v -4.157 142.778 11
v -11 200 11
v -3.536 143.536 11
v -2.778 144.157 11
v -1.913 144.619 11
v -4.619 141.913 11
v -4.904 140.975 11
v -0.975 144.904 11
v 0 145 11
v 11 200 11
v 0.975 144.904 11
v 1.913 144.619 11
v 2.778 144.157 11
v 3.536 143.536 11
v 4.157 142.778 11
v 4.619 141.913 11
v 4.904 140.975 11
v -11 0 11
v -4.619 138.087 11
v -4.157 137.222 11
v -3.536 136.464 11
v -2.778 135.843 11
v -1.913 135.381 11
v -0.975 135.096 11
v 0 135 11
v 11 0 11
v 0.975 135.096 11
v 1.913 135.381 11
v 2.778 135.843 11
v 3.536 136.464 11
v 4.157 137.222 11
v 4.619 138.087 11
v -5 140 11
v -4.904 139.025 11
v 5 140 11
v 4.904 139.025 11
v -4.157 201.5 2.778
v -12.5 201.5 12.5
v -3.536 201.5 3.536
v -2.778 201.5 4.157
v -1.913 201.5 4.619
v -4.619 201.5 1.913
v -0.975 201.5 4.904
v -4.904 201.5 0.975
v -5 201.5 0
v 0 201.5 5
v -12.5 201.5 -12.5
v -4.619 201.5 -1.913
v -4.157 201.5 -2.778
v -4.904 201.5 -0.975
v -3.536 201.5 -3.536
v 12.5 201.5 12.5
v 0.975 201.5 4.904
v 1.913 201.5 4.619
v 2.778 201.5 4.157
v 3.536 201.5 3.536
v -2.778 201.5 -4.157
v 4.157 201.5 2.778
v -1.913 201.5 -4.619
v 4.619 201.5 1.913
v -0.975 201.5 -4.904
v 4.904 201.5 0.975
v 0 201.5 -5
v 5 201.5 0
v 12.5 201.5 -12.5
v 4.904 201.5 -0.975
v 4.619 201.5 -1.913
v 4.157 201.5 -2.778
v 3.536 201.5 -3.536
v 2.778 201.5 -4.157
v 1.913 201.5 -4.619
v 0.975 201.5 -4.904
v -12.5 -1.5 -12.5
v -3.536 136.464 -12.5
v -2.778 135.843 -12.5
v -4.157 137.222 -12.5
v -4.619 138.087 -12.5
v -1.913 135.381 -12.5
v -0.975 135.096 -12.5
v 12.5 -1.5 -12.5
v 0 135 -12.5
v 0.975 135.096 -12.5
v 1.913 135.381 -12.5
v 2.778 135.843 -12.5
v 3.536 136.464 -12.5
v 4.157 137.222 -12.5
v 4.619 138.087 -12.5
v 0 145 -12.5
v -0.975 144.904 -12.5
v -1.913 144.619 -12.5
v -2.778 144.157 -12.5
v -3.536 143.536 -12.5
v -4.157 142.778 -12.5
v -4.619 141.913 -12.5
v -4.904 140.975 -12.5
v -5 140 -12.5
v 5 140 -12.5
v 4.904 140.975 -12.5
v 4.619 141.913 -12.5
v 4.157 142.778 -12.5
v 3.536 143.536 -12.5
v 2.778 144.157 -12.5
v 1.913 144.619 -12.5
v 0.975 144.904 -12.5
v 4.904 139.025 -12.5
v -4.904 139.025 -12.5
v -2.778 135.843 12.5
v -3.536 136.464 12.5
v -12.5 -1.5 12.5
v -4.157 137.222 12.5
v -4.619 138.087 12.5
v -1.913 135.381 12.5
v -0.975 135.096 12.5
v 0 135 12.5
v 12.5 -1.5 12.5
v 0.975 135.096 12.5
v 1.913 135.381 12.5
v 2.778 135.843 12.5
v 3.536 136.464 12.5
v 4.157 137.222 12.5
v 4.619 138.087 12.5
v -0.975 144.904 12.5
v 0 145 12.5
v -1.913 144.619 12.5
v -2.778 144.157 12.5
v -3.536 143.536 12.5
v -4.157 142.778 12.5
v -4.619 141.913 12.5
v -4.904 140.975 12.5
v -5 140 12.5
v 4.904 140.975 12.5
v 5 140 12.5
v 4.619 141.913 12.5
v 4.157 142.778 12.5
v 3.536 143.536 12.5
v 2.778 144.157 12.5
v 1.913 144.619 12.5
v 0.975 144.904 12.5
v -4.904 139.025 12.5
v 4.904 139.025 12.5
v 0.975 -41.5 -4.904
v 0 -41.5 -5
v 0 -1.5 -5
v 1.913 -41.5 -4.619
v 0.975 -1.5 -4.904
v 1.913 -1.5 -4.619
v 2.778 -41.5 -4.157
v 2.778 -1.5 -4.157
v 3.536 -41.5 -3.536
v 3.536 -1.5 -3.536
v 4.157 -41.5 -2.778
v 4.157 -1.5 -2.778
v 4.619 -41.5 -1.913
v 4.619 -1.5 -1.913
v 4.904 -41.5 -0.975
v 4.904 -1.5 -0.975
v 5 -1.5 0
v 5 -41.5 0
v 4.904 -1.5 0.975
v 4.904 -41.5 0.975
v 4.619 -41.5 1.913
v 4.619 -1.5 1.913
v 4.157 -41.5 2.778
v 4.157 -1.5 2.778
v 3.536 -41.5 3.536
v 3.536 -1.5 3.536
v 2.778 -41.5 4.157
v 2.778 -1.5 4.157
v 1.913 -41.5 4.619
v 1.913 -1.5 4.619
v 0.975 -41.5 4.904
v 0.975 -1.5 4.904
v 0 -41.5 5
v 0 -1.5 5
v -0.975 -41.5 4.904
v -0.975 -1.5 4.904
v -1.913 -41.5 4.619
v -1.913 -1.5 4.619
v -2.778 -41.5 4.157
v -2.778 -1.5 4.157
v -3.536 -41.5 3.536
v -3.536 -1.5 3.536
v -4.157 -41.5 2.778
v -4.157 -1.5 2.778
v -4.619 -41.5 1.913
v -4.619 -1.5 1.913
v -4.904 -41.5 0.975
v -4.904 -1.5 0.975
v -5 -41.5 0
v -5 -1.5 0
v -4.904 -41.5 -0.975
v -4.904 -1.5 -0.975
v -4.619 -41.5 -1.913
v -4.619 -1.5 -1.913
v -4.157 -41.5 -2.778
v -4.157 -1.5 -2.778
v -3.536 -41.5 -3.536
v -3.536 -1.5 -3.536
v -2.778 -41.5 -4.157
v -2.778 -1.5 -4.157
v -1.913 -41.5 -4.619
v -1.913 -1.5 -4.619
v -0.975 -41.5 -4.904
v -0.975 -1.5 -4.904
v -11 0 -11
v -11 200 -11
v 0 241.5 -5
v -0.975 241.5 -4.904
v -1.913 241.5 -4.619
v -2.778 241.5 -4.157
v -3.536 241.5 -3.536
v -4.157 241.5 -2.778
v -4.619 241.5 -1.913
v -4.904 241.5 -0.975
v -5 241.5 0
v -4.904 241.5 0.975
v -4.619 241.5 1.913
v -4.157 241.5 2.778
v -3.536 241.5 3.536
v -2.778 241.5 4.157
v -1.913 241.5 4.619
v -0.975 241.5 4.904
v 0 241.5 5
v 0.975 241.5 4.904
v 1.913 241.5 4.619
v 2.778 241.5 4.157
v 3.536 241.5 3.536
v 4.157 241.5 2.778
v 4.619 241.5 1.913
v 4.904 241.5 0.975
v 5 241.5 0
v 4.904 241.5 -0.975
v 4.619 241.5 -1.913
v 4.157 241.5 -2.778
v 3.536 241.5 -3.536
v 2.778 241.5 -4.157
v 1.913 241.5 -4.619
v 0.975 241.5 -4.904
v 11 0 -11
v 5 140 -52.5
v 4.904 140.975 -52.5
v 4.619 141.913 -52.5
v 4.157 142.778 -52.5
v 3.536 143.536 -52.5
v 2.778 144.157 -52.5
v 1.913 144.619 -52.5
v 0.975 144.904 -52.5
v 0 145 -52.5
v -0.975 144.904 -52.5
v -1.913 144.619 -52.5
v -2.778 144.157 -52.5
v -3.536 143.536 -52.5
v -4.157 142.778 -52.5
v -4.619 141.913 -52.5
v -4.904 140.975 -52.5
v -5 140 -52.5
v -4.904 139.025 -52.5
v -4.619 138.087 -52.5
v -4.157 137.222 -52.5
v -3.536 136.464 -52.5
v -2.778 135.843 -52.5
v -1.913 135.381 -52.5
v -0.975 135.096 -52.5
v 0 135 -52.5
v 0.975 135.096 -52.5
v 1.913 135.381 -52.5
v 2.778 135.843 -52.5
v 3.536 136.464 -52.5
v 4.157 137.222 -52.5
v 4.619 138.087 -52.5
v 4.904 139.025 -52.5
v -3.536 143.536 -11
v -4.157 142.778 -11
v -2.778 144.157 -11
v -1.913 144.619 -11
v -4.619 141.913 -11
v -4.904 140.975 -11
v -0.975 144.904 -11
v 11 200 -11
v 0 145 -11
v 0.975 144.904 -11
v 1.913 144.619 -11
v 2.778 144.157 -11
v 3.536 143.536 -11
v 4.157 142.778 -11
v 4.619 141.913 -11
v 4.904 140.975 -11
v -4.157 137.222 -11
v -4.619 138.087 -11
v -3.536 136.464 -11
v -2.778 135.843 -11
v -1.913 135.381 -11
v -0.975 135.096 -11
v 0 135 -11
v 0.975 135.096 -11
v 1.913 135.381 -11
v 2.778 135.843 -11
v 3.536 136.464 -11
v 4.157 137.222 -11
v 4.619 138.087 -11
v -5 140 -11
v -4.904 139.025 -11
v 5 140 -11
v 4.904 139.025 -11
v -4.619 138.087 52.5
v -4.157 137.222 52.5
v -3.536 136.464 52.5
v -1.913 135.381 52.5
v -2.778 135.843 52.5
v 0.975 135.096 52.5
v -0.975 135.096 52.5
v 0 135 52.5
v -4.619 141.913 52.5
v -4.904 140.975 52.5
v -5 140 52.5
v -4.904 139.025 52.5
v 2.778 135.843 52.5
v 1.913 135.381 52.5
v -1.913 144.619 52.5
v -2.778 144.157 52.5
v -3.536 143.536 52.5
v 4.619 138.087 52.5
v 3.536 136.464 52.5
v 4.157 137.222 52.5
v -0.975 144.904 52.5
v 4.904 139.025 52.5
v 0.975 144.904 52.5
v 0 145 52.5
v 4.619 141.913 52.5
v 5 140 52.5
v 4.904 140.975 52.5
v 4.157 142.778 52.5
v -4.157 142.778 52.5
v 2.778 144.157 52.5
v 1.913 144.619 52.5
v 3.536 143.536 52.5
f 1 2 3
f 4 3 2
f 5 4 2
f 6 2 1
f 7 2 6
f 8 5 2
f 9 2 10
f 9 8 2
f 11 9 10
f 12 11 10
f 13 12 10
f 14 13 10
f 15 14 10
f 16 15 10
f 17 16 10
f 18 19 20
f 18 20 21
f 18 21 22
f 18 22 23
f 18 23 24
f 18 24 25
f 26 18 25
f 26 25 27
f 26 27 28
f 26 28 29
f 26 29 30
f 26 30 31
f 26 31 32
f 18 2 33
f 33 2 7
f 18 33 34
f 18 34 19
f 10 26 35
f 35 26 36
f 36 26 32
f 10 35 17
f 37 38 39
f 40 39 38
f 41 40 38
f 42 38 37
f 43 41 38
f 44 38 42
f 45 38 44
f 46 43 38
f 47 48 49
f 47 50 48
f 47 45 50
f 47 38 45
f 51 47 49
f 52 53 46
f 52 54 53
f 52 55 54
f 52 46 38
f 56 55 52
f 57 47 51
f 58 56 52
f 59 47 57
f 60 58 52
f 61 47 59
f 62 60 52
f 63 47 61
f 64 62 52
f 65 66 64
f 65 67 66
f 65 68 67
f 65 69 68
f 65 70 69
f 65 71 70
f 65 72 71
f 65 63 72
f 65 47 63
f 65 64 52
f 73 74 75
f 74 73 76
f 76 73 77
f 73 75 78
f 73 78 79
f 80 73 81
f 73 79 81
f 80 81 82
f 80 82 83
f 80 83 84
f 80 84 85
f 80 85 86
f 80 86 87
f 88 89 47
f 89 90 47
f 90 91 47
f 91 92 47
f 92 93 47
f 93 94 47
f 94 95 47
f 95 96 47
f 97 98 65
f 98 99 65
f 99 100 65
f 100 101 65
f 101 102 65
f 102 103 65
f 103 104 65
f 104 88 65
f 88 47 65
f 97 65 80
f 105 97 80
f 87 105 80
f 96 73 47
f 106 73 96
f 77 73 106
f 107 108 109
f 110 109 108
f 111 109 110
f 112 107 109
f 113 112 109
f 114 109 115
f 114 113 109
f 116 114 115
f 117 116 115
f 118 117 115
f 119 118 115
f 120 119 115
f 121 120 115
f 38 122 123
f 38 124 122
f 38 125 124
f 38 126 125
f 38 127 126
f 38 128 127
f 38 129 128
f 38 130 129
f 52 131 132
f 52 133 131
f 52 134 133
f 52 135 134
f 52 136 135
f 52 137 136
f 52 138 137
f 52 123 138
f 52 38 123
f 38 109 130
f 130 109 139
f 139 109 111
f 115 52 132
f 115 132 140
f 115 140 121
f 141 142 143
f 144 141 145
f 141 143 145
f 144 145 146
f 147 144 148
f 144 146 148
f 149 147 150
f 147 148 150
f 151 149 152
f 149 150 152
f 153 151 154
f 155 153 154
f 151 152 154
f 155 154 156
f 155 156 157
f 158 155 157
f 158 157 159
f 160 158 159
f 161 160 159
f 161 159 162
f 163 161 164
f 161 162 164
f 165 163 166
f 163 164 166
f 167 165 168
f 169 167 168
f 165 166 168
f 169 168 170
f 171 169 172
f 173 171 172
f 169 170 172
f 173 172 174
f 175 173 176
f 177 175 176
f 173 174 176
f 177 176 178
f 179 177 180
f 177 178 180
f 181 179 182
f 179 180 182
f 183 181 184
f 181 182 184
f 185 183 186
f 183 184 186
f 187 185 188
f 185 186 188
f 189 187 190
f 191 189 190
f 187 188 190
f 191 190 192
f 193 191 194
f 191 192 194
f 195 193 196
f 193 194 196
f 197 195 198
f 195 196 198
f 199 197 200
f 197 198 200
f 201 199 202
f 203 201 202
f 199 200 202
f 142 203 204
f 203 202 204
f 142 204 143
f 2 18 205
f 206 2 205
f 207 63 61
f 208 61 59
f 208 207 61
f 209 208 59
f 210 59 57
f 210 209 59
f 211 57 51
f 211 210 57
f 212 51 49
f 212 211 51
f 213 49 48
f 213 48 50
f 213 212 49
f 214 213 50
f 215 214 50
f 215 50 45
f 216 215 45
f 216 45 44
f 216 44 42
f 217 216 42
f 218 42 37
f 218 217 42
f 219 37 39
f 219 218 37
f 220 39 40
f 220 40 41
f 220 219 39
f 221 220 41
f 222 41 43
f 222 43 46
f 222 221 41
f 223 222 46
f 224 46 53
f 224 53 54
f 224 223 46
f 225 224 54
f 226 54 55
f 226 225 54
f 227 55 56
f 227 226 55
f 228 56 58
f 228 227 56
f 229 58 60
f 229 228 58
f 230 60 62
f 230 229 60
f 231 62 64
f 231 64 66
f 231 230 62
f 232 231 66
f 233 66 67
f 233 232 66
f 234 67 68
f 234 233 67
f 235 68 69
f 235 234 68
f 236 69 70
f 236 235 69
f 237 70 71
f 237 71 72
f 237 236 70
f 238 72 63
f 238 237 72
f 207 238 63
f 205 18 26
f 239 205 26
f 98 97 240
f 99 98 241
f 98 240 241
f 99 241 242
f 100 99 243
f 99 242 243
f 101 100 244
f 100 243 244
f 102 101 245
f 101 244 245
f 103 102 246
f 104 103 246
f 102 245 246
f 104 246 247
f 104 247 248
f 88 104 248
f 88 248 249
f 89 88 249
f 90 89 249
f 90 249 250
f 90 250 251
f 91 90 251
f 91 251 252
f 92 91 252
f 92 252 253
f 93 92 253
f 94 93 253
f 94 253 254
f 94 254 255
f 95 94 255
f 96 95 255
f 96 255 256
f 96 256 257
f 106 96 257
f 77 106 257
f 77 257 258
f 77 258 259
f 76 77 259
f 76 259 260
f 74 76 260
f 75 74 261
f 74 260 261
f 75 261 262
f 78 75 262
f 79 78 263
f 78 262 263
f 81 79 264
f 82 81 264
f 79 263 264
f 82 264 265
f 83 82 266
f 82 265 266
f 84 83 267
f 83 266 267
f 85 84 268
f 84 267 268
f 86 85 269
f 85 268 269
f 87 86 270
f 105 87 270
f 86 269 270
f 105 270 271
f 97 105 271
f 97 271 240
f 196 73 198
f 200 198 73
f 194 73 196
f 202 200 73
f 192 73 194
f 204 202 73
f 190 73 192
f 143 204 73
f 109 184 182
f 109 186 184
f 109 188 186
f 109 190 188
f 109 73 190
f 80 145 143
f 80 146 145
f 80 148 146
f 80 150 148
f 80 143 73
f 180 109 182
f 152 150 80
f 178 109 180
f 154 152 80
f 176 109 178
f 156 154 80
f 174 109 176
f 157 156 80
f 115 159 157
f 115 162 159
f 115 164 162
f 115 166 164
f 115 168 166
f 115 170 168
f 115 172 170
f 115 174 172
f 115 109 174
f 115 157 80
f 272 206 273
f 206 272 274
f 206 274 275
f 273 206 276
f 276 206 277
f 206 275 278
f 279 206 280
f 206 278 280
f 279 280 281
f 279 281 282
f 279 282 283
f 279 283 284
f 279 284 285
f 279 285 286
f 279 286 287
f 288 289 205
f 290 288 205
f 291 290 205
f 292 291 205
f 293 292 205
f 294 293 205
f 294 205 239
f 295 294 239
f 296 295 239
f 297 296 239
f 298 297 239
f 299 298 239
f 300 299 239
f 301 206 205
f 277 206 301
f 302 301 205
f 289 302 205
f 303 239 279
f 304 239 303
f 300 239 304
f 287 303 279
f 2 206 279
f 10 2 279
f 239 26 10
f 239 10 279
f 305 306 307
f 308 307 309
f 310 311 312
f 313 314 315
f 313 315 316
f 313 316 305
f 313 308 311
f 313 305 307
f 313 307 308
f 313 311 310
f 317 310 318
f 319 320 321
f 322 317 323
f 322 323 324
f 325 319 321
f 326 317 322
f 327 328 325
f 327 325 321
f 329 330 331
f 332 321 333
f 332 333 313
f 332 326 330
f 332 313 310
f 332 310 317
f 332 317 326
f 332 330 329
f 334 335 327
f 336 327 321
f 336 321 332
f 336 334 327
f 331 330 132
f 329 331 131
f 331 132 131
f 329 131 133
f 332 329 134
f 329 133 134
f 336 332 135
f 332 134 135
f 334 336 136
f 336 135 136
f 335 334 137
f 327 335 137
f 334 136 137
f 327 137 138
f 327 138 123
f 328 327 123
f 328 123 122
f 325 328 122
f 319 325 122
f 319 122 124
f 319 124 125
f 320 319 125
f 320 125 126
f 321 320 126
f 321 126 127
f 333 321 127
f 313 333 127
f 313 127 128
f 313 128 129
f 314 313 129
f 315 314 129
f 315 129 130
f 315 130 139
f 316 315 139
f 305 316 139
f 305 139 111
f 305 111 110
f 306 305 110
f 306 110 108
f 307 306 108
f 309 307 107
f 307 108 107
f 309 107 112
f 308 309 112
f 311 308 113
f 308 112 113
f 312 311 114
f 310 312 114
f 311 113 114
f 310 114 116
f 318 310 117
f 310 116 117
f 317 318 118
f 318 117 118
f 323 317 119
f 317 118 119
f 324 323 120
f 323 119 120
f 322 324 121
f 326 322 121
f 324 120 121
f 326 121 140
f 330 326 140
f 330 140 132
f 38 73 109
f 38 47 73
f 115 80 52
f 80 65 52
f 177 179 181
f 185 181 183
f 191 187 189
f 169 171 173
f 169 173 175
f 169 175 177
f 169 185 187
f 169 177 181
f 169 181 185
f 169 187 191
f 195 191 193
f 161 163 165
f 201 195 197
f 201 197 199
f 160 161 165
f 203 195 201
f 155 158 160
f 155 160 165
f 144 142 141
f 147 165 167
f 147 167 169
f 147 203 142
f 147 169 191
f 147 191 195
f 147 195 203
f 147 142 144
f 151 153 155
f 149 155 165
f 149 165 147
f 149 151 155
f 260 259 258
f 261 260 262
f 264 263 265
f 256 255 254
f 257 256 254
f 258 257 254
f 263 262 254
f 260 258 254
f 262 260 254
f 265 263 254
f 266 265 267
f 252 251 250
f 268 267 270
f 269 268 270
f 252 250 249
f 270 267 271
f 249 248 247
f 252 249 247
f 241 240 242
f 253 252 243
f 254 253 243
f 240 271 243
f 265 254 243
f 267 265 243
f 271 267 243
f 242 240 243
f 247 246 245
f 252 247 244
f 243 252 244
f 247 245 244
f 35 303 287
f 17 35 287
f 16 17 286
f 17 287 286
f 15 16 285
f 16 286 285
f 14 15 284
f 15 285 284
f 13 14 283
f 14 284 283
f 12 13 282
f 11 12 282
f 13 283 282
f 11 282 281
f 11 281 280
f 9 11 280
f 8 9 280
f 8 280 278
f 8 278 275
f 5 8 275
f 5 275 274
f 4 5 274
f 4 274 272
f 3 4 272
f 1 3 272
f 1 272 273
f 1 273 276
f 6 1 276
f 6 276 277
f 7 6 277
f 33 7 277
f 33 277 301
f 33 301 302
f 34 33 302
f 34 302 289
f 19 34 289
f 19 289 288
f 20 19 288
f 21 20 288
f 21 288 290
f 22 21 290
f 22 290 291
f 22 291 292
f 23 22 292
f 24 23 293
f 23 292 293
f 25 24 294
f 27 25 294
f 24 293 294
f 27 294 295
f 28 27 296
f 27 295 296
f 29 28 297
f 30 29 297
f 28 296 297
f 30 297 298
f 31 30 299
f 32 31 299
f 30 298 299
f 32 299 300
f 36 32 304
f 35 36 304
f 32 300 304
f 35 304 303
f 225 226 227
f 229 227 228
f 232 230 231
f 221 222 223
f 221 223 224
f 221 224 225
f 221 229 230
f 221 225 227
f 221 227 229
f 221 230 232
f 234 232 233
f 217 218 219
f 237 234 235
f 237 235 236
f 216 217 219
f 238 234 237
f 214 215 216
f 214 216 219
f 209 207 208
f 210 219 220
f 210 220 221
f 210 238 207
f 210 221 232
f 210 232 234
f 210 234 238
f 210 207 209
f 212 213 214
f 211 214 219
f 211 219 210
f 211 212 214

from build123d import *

# Parameters (mm, degrees)
SKETCH3_W                = 25
SKETCH3_H                = 25
SKETCH3_W_2              = 22
SKETCH3_H_2              = 22
BOSS_EXTRUDE1_DEPTH      = 200
SKETCH4_R                = 5
CUT_EXTRUDE1_DEPTH       = 25
BOSS_EXTRUDE2_DEPTH      = 52.5
BOSS_EXTRUDE2_DEPTH_BACK = 52.5
SKETCH5_R                = 5
SKETCH6_W                = 25
SKETCH6_H                = 25
BOSS_EXTRUDE3_DEPTH      = 1.5
SKETCH7_W                = 25
SKETCH7_H                = 25
BOSS_EXTRUDE4_DEPTH      = 1.5
SKETCH8_R                = 5
BOSS_EXTRUDE5_DEPTH      = 40
BOSS_EXTRUDE6_START      = 40
SKETCH9_R                = 5
BOSS_EXTRUDE6_DEPTH      = 40


with BuildPart() as part:
    # Sketch3 → Boss-Extrude1 (new body)
    with BuildSketch(Plane(origin=(0, 0, 0), x_dir=(1, 0, 0), z_dir=(0, 1, 0))):
        Rectangle(SKETCH3_W, SKETCH3_H)
        Rectangle(SKETCH3_W_2, SKETCH3_H_2, mode=Mode.SUBTRACT)
    extrude(amount=BOSS_EXTRUDE1_DEPTH)

    # Sketch4 → Cut-Extrude1 (cut)
    with BuildSketch(Plane.XY.offset(12.5)):
        with Locations((0, 140)):
            Circle(SKETCH4_R)
    extrude(amount=-CUT_EXTRUDE1_DEPTH, mode=Mode.SUBTRACT)

    # Sketch5 → Boss-Extrude2 (add, two sides: drawn at the far end of the back side and taken through both)
    with BuildSketch(Plane.XY.offset(-BOSS_EXTRUDE2_DEPTH_BACK)):
        with Locations((0, 140)):
            Circle(SKETCH5_R)
    extrude(amount=BOSS_EXTRUDE2_DEPTH + BOSS_EXTRUDE2_DEPTH_BACK)

    # Sketch6 → Boss-Extrude3 (add)
    with BuildSketch(Plane(origin=(0, 200, 0), x_dir=(1, 0, 0), z_dir=(0, 1, 0))):
        Rectangle(SKETCH6_W, SKETCH6_H)
    extrude(amount=BOSS_EXTRUDE3_DEPTH)

    # Sketch7 → Boss-Extrude4 (add)
    with BuildSketch(Plane.XZ):
        Rectangle(SKETCH7_W, SKETCH7_H)
    extrude(amount=BOSS_EXTRUDE4_DEPTH)

    # Sketch8 → Boss-Extrude5 (add)
    with BuildSketch(Plane.XZ.offset(1.5)):
        with Locations(Location((0, 0, 0), (0, 0, 270))):
            Circle(SKETCH8_R)
    extrude(amount=BOSS_EXTRUDE5_DEPTH)

    # Sketch9 → Boss-Extrude6 (add)
    with BuildSketch(Plane(origin=(0, 201.5, 0), x_dir=(1, 0, 0), z_dir=(0, 1, 0)).offset(BOSS_EXTRUDE6_START)):
        with Locations(Location((0, 0, 0), (0, 0, 90))):
            Circle(SKETCH9_R)
    extrude(amount=-BOSS_EXTRUDE6_DEPTH)


solid = part.part
